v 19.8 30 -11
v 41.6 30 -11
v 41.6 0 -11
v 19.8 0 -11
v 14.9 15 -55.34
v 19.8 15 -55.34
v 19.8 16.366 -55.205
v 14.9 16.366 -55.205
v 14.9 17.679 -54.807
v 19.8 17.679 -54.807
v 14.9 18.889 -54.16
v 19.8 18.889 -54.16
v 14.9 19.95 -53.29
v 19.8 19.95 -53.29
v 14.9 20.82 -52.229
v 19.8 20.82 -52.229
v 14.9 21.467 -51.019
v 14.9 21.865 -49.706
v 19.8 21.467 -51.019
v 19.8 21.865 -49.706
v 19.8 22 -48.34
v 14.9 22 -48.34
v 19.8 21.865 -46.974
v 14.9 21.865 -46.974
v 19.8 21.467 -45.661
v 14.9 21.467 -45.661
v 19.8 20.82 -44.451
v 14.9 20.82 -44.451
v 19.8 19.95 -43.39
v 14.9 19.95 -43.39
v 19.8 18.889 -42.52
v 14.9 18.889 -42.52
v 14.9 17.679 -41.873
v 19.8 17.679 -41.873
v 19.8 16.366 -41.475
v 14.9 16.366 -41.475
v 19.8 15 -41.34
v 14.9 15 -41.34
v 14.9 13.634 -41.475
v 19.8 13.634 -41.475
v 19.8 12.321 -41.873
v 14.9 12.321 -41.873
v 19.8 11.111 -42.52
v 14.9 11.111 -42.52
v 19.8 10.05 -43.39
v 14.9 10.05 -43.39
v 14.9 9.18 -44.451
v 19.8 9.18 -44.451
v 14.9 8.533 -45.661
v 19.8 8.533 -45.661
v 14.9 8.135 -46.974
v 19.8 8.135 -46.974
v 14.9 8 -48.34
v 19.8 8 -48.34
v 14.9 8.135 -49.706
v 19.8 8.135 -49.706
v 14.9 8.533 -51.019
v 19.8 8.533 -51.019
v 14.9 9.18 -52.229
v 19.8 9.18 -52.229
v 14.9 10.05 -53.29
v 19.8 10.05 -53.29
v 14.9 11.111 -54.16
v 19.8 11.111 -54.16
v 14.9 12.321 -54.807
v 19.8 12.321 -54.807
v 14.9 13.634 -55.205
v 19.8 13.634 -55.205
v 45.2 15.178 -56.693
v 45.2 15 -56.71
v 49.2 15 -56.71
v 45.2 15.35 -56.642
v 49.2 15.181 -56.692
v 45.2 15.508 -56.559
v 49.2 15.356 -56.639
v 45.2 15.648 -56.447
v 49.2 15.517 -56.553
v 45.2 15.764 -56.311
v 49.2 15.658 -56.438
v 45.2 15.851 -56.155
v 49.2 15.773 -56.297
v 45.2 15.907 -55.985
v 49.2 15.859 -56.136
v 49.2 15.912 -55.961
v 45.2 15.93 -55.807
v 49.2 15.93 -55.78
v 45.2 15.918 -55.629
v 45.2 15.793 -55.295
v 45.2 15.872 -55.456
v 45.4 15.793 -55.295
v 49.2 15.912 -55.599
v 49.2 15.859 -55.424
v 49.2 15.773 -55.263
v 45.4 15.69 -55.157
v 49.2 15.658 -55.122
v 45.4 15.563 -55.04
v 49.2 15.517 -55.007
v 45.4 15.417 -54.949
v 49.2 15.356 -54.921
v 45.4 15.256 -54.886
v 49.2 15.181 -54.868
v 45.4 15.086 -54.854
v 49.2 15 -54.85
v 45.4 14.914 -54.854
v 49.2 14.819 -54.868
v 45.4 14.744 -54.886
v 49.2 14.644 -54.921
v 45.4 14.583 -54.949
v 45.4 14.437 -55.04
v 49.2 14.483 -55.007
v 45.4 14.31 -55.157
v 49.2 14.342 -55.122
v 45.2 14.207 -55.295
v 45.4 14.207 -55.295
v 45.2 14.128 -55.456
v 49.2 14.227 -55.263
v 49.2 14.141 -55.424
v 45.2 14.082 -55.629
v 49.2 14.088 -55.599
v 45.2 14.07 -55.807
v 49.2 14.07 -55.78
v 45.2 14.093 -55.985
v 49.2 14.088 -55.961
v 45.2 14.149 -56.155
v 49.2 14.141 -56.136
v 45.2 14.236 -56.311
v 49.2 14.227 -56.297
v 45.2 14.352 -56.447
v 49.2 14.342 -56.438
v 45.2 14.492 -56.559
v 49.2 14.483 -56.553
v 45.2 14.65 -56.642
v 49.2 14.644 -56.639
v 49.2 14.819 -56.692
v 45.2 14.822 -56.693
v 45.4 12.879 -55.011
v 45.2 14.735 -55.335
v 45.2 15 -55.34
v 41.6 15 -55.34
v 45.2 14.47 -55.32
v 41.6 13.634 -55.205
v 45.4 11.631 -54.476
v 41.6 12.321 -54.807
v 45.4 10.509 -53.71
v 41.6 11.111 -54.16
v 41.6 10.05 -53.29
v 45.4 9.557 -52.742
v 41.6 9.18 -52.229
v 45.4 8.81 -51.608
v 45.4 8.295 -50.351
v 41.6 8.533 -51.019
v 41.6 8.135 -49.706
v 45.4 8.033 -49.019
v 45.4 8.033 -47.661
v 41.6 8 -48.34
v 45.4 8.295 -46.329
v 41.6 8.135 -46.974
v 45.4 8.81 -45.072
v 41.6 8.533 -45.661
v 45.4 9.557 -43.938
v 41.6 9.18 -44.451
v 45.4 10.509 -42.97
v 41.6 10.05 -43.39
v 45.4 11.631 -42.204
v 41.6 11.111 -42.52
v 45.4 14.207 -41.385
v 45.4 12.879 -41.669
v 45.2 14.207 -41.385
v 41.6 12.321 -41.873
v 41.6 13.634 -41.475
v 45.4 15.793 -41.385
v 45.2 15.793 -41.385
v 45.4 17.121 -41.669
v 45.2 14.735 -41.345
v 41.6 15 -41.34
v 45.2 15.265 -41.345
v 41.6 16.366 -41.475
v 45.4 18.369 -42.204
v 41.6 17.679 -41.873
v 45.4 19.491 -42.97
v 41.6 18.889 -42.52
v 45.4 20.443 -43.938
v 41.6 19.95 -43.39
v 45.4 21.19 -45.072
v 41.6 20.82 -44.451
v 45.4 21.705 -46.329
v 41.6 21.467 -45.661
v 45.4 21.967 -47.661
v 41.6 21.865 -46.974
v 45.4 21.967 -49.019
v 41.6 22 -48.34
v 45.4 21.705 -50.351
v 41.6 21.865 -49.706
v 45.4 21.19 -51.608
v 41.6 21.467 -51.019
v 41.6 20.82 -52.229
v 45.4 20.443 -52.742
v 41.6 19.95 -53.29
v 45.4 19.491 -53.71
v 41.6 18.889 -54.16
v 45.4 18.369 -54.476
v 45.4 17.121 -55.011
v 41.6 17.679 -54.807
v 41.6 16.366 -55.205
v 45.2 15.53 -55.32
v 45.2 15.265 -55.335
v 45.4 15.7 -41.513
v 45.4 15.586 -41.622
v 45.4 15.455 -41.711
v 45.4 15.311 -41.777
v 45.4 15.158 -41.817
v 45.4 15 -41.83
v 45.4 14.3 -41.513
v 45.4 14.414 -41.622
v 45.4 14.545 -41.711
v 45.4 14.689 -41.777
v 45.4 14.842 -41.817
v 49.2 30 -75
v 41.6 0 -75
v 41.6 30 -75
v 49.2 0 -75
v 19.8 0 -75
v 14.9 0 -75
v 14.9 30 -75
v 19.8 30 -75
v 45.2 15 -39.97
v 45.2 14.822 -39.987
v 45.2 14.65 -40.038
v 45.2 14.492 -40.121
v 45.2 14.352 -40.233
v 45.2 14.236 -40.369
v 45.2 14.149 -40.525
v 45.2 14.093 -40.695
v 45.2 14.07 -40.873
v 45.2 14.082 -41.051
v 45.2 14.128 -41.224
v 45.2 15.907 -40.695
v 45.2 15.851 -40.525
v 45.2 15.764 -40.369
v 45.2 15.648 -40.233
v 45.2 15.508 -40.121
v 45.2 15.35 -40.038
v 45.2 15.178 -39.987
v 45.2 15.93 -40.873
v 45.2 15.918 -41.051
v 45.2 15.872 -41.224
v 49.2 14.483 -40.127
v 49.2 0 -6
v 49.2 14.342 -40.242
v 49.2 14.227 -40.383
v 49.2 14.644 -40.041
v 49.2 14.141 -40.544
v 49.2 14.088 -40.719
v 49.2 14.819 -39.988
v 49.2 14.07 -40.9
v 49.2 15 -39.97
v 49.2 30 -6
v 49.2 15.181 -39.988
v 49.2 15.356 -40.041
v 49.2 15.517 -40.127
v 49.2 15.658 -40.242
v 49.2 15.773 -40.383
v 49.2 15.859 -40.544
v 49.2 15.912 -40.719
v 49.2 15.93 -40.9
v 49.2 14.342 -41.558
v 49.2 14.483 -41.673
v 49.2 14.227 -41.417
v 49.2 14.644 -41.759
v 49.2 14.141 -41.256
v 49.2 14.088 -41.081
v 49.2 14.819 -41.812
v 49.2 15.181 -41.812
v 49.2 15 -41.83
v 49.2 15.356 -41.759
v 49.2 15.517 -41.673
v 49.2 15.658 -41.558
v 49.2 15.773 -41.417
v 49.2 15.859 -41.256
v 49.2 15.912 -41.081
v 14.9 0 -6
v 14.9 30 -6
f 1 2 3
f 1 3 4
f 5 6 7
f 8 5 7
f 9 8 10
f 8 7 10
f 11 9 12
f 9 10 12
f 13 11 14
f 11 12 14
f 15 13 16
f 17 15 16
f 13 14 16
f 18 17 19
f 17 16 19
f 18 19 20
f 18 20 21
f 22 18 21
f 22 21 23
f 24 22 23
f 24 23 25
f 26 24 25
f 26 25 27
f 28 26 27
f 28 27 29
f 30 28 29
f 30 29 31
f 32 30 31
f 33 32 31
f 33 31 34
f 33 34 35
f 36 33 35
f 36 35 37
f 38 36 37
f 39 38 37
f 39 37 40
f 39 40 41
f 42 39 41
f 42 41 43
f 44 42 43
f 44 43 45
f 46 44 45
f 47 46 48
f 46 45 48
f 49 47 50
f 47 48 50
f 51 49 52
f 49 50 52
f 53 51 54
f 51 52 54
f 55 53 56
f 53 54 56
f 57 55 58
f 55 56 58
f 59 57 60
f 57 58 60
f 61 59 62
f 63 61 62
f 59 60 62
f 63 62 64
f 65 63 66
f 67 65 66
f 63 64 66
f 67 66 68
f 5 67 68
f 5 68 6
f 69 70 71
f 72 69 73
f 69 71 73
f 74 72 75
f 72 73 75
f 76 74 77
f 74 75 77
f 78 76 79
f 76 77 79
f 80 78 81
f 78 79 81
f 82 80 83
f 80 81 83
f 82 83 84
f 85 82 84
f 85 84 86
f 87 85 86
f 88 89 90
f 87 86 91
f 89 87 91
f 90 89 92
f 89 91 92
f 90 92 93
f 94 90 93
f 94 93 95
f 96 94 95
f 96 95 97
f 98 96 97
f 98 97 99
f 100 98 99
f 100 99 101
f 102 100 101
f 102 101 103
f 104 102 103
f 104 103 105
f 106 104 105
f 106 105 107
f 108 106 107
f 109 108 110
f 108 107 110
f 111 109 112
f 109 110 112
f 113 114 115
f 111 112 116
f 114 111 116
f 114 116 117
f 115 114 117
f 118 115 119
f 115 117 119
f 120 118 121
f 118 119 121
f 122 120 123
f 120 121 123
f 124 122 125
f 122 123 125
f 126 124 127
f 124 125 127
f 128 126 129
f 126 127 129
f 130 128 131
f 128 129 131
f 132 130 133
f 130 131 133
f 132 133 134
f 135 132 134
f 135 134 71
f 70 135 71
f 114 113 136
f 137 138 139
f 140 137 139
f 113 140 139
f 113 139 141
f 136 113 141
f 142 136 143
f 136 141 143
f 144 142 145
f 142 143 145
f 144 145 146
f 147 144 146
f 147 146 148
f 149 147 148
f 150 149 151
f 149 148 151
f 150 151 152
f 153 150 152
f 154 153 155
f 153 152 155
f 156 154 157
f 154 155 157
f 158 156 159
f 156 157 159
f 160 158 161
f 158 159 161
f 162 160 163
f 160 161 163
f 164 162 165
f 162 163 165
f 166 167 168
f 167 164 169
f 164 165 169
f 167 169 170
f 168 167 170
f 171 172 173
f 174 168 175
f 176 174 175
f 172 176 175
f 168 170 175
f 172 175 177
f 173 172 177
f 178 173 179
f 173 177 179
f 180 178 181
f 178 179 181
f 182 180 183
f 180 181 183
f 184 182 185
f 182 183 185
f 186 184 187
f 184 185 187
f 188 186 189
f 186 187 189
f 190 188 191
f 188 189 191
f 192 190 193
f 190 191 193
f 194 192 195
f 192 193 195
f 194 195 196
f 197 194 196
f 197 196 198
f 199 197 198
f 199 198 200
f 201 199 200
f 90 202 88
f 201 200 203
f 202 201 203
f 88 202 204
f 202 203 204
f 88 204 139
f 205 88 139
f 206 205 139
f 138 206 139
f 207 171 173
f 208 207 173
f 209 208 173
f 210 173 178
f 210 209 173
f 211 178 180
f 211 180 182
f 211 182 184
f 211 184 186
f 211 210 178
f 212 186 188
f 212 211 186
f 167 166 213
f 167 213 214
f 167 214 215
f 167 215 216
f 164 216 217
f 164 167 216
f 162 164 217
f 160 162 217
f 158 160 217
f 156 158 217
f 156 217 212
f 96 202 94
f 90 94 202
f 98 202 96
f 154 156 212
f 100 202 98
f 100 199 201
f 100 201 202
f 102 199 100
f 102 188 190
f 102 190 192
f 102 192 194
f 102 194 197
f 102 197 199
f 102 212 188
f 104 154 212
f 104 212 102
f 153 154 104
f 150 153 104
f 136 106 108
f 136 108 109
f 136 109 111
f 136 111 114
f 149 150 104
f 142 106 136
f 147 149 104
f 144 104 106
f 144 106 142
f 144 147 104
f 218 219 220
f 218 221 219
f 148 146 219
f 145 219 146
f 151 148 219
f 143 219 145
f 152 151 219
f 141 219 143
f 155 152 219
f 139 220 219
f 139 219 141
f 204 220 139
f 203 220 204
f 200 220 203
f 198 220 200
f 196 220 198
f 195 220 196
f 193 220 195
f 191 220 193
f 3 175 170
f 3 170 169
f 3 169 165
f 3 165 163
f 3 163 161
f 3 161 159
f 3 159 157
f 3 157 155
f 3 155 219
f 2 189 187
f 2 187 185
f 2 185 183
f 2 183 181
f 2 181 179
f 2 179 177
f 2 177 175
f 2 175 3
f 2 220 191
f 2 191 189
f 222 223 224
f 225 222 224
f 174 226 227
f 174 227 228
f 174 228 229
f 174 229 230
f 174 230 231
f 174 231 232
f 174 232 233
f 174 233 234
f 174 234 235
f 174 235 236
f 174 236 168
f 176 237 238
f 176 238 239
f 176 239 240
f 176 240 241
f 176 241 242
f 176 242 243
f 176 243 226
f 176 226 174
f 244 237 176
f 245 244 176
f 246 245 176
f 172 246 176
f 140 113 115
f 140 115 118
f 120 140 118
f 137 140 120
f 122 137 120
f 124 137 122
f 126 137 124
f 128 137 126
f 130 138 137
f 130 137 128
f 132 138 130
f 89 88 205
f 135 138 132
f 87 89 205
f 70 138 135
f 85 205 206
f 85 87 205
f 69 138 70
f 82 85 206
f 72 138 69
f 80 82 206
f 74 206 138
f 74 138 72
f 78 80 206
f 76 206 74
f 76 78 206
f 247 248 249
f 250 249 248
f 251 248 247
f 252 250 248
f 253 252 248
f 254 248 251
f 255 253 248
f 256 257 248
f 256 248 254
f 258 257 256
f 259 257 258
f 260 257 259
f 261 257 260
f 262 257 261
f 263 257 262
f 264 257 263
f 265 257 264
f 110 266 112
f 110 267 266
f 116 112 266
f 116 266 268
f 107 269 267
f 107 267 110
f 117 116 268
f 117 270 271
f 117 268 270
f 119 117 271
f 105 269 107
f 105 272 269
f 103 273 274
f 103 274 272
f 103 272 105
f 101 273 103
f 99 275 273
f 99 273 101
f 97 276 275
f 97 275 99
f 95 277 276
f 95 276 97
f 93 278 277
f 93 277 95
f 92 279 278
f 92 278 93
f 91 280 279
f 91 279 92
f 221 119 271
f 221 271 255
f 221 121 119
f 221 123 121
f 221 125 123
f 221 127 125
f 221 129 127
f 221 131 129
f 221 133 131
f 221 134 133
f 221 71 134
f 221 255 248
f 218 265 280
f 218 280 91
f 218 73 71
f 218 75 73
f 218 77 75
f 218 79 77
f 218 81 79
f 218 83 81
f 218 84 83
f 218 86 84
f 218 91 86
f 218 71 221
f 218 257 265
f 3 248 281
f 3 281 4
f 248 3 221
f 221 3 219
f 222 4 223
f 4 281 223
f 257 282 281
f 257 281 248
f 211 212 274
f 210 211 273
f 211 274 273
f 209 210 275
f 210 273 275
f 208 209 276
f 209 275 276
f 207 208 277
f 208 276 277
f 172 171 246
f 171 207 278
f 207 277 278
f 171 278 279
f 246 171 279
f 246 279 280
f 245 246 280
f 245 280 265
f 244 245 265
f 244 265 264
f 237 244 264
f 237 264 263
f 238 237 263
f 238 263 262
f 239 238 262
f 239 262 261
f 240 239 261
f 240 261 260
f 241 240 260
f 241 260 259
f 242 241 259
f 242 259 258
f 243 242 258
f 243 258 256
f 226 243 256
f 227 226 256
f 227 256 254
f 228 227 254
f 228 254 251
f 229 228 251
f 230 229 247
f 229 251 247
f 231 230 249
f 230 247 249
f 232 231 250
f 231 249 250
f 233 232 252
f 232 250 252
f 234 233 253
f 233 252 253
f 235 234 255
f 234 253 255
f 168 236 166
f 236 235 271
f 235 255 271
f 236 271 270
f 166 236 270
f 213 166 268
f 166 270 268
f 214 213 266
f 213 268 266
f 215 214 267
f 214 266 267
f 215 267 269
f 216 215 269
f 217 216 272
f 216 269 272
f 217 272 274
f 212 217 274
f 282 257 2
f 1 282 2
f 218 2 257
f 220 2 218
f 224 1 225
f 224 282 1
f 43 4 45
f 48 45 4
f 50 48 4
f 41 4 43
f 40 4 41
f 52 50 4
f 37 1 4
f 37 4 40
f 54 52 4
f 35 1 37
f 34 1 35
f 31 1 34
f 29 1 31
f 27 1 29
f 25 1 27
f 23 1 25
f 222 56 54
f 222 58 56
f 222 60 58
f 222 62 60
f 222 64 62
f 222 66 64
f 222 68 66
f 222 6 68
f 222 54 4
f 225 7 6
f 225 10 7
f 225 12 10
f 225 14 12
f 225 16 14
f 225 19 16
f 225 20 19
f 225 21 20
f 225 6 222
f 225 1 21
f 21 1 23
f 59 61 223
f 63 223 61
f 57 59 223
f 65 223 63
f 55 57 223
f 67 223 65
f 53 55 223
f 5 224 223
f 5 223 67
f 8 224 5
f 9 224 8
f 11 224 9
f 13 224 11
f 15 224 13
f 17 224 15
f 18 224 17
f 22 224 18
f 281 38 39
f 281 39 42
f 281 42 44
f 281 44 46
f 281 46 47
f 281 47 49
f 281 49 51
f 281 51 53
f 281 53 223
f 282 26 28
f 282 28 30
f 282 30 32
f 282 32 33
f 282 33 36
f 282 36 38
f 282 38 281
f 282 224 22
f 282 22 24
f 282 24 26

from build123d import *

# Parameters (mm, degrees)
BOSS_EXTRUDE1_DEPTH = 30
SKETCH2_R           = 7
CUT_EXTRUDE1_DEPTH  = 70
SKETCH3_W           = 111.167782235
SKETCH3_H           = 40.74685258
CUT_EXTRUDE2_DEPTH  = 0.8
SKETCH5_W           = 117.774687649
SKETCH5_H           = 158.291815666
CUT_EXTRUDE3_DEPTH  = 0.8
SKETCH6_W           = 70
SKETCH6_H           = 30
BOSS_EXTRUDE2_DEPTH = 3.4
SKETCH7_W           = 70
SKETCH7_H           = 30
BOSS_EXTRUDE3_DEPTH = 6.7
SKETCH8_W           = 83.763231722
SKETCH8_H           = 77.916949986
CUT_EXTRUDE5_DEPTH  = 6
SKETCH9_R           = 7
CUT_EXTRUDE6_DEPTH  = 90.354574589
SKETCH10_W          = 29.9
SKETCH10_H          = 30
BOSS_EXTRUDE4_DEPTH = 6
SKETCH11_W          = 55.967068903
SKETCH11_H          = 62.229878259
CUT_EXTRUDE7_DEPTH  = 6
SKETCH12_W          = 64
SKETCH12_H          = 30
BOSS_EXTRUDE6_DEPTH = 4.05
SKETCH13_W          = 85.617860434
SKETCH13_H          = 123.38327663
CUT_EXTRUDE9_DEPTH  = 4.05
SKETCH15_W          = 39.049263631
SKETCH15_H          = 151.632152685
CUT_EXTRUDE10_DEPTH = 3.95
SKETCH16_W          = 64
SKETCH16_H          = 30
BOSS_EXTRUDE7_DEPTH = 4.05
SKETCH17_W          = 96.474130843
SKETCH17_H          = 104.566259817
CUT_EXTRUDE11_DEPTH = 4.05
SKETCH18_W          = 6.755230809
SKETCH18_H          = 55.059186595
CUT_EXTRUDE12_DEPTH = 4.05
SKETCH19_R          = 7
CUT_EXTRUDE14_DEPTH = 34.05
SKETCH23_W          = 19.849593964
SKETCH23_H          = 19.85515092
BOSS_EXTRUDE9_DEPTH = 4.2
SKETCH24_R          = 0.93
CUT_EXTRUDE16_DEPTH = 4
SKETCH24_5_R        = 0.93
CUT_EXTRUDE17_DEPTH = 4
SKETCH26_R          = 7
CUT_EXTRUDE18_DEPTH = 0.4


with BuildPart() as part:
    # Sketch1 → Boss-Extrude1 (new body)
    with BuildSketch(Plane(origin=(0, 0, 0), x_dir=(1, 0, 0), z_dir=(0, 1, 0))):
        Polygon((0, 0), (50, 0), (50, 75), (45, 75), (45, 5), (5, 5), (5, 75), (0, 75), align=None)
    extrude(amount=BOSS_EXTRUDE1_DEPTH)

    # Sketch2 → Cut-Extrude1 (cut)
    with BuildSketch(Plane(origin=(50, 0, 0), x_dir=(0, 0, -1), z_dir=(1, 0, 0))):
        with Locations((48.34, 15)):
            Circle(SKETCH2_R)
    extrude(amount=-CUT_EXTRUDE1_DEPTH, mode=Mode.SUBTRACT)

    # Sketch3 → Cut-Extrude2 (cut)
    with BuildSketch(Plane(origin=(50, 0, 0), x_dir=(0, 0, -1), z_dir=(1, 0, 0))):
        with Locations((37.634857553, 15.397923555)):
            Rectangle(SKETCH3_W, SKETCH3_H)
    extrude(amount=-CUT_EXTRUDE2_DEPTH, mode=Mode.SUBTRACT)

    # Sketch5 → Cut-Extrude3 (cut)
    with BuildSketch(Plane.ZY):
        with Locations((-53.14418593, -0.770080807)):
            Rectangle(SKETCH5_W, SKETCH5_H)
    extrude(amount=-CUT_EXTRUDE3_DEPTH, mode=Mode.SUBTRACT)

    # Sketch6 → Boss-Extrude2 (add)
    with BuildSketch(Plane.ZY.offset(-45)):
        with Locations((-40, 15)):
            Rectangle(SKETCH6_W, SKETCH6_H)
    extrude(amount=BOSS_EXTRUDE2_DEPTH)

    # Sketch7 → Boss-Extrude3 (add)
    with BuildSketch(Plane(origin=(5, 0, 0), x_dir=(0, 0, -1), z_dir=(1, 0, 0))):
        with Locations((40, 15)):
            Rectangle(SKETCH7_W, SKETCH7_H)
    extrude(amount=BOSS_EXTRUDE3_DEPTH)

    # Sketch8 → Cut-Extrude5 (cut)
    with BuildSketch(Plane.ZY.offset(-0.8)):
        with Locations((-33.178908474, 22.347774268)):
            Rectangle(SKETCH8_W, SKETCH8_H)
    extrude(amount=-CUT_EXTRUDE5_DEPTH, mode=Mode.SUBTRACT)

    # Sketch9 → Cut-Extrude6 (cut, through all)
    with BuildSketch(Plane(origin=(45, 0, 0), x_dir=(0, 0, -1), z_dir=(1, 0, 0))):
        with Locations((48.34, 15)):
            Circle(SKETCH9_R)
    extrude(amount=-CUT_EXTRUDE6_DEPTH, mode=Mode.SUBTRACT)

    # Sketch10 → Boss-Extrude4 (add)
    with BuildSketch(Plane(origin=(0, 0, -5), x_dir=(-1, 0, 0), z_dir=(0, 0, -1))):
        with Locations((-26.65, 15)):
            Rectangle(SKETCH10_W, SKETCH10_H)
    extrude(amount=BOSS_EXTRUDE4_DEPTH)

    # Sketch11 → Cut-Extrude7 (cut)
    with BuildSketch(Plane.XY):
        with Locations((27.983534452, 15.70224338)):
            Rectangle(SKETCH11_W, SKETCH11_H)
    extrude(amount=-CUT_EXTRUDE7_DEPTH, mode=Mode.SUBTRACT)

    # Sketch12 → Boss-Extrude6 (add)
    with BuildSketch(Plane(origin=(11.7, 0, 0), x_dir=(0, 0, -1), z_dir=(1, 0, 0))):
        with Locations((43, 15)):
            Rectangle(SKETCH12_W, SKETCH12_H)
    extrude(amount=BOSS_EXTRUDE6_DEPTH)

    # Sketch13 → Cut-Extrude9 (cut)
    with BuildSketch(Plane.ZY.offset(-6.8)):
        with Locations((-48.94815067, 16.542324461)):
            Rectangle(SKETCH13_W, SKETCH13_H)
    extrude(amount=-CUT_EXTRUDE9_DEPTH, mode=Mode.SUBTRACT)

    # Sketch15 → Cut-Extrude10 (cut)
    with BuildSketch(Plane.ZY.offset(-6.8)):
        with Locations((0.466031991, 2.740241295)):
            Rectangle(SKETCH15_W, SKETCH15_H)
    extrude(amount=-CUT_EXTRUDE10_DEPTH, mode=Mode.SUBTRACT)

    # Sketch16 → Boss-Extrude7 (add)
    with BuildSketch(Plane(origin=(15.75, 0, 0), x_dir=(0, 0, -1), z_dir=(1, 0, 0))):
        with Locations((43, 15)):
            Rectangle(SKETCH16_W, SKETCH16_H)
    extrude(amount=BOSS_EXTRUDE7_DEPTH)

    # Sketch17 → Cut-Extrude11 (cut)
    with BuildSketch(Plane.ZY.offset(-10.85)):
        with Locations((-42.673680758, 11.569509922)):
            Rectangle(SKETCH17_W, SKETCH17_H)
    extrude(amount=-CUT_EXTRUDE11_DEPTH, mode=Mode.SUBTRACT)


with BuildPart() as cut_extrude11_piece_1:
    # of the separate pieces the step leaves, piece 1, a body of its own (cut_extrude11_pieces)
    add(part.part.solids().sort_by_distance((14.9, 0, -75))[0])

    # Sketch19 → Cut-Extrude14 (cut)
    with BuildSketch(Plane(origin=(19.8, 0, 0), x_dir=(0, 0, -1), z_dir=(1, 0, 0))):
        with Locations((48.34, 15)):
            Circle(SKETCH19_R)
    extrude(amount=-CUT_EXTRUDE14_DEPTH, mode=Mode.SUBTRACT)

    # Sketch23 → Boss-Extrude9 (add)
    with BuildSketch(Plane(origin=(49.2, 0, 0), x_dir=(0, 0, -1), z_dir=(1, 0, 0))):
        with Locations((46.616592264, 15.948021262)):
            Rectangle(SKETCH23_W, SKETCH23_H)
    extrude(amount=-BOSS_EXTRUDE9_DEPTH)

    # Sketch24 → Cut-Extrude16 (cut)
    with BuildSketch(Plane(origin=(49.2, 0, 0), x_dir=(0, 0, -1), z_dir=(1, 0, 0))):
        with Locations((55.78, 15)):
            Circle(SKETCH24_R)
    extrude(amount=-CUT_EXTRUDE16_DEPTH, mode=Mode.SUBTRACT)

    # Sketch24<5> → Cut-Extrude17 (cut)
    with BuildSketch(Plane(origin=(49.2, 0, 0), x_dir=(0, 0, -1), z_dir=(1, 0, 0))):
        with Locations((40.9, 15)):
            Circle(SKETCH24_5_R)
    extrude(amount=-CUT_EXTRUDE17_DEPTH, mode=Mode.SUBTRACT)

    # Sketch26 → Cut-Extrude18 (cut)
    with BuildSketch(Plane.ZY.offset(-45)):
        with Locations((-48.34, 15)):
            Circle(SKETCH26_R)
    extrude(amount=-CUT_EXTRUDE18_DEPTH, mode=Mode.SUBTRACT)


with BuildPart() as cut_extrude11_piece_2:
    # of the separate pieces the step leaves, piece 2, a body of its own (cut_extrude11_pieces)
    add(part.part.solids().sort_by_distance((10.85, 0, -6))[0])

    # Sketch18 → Cut-Extrude12 (cut)
    with BuildSketch(Plane.ZY.offset(-10.75)):
        with Locations((-5.990573003, 11.129995274)):
            Rectangle(SKETCH18_W, SKETCH18_H)
    extrude(amount=-CUT_EXTRUDE12_DEPTH, mode=Mode.SUBTRACT)


solid = cut_extrude11_piece_1.part
